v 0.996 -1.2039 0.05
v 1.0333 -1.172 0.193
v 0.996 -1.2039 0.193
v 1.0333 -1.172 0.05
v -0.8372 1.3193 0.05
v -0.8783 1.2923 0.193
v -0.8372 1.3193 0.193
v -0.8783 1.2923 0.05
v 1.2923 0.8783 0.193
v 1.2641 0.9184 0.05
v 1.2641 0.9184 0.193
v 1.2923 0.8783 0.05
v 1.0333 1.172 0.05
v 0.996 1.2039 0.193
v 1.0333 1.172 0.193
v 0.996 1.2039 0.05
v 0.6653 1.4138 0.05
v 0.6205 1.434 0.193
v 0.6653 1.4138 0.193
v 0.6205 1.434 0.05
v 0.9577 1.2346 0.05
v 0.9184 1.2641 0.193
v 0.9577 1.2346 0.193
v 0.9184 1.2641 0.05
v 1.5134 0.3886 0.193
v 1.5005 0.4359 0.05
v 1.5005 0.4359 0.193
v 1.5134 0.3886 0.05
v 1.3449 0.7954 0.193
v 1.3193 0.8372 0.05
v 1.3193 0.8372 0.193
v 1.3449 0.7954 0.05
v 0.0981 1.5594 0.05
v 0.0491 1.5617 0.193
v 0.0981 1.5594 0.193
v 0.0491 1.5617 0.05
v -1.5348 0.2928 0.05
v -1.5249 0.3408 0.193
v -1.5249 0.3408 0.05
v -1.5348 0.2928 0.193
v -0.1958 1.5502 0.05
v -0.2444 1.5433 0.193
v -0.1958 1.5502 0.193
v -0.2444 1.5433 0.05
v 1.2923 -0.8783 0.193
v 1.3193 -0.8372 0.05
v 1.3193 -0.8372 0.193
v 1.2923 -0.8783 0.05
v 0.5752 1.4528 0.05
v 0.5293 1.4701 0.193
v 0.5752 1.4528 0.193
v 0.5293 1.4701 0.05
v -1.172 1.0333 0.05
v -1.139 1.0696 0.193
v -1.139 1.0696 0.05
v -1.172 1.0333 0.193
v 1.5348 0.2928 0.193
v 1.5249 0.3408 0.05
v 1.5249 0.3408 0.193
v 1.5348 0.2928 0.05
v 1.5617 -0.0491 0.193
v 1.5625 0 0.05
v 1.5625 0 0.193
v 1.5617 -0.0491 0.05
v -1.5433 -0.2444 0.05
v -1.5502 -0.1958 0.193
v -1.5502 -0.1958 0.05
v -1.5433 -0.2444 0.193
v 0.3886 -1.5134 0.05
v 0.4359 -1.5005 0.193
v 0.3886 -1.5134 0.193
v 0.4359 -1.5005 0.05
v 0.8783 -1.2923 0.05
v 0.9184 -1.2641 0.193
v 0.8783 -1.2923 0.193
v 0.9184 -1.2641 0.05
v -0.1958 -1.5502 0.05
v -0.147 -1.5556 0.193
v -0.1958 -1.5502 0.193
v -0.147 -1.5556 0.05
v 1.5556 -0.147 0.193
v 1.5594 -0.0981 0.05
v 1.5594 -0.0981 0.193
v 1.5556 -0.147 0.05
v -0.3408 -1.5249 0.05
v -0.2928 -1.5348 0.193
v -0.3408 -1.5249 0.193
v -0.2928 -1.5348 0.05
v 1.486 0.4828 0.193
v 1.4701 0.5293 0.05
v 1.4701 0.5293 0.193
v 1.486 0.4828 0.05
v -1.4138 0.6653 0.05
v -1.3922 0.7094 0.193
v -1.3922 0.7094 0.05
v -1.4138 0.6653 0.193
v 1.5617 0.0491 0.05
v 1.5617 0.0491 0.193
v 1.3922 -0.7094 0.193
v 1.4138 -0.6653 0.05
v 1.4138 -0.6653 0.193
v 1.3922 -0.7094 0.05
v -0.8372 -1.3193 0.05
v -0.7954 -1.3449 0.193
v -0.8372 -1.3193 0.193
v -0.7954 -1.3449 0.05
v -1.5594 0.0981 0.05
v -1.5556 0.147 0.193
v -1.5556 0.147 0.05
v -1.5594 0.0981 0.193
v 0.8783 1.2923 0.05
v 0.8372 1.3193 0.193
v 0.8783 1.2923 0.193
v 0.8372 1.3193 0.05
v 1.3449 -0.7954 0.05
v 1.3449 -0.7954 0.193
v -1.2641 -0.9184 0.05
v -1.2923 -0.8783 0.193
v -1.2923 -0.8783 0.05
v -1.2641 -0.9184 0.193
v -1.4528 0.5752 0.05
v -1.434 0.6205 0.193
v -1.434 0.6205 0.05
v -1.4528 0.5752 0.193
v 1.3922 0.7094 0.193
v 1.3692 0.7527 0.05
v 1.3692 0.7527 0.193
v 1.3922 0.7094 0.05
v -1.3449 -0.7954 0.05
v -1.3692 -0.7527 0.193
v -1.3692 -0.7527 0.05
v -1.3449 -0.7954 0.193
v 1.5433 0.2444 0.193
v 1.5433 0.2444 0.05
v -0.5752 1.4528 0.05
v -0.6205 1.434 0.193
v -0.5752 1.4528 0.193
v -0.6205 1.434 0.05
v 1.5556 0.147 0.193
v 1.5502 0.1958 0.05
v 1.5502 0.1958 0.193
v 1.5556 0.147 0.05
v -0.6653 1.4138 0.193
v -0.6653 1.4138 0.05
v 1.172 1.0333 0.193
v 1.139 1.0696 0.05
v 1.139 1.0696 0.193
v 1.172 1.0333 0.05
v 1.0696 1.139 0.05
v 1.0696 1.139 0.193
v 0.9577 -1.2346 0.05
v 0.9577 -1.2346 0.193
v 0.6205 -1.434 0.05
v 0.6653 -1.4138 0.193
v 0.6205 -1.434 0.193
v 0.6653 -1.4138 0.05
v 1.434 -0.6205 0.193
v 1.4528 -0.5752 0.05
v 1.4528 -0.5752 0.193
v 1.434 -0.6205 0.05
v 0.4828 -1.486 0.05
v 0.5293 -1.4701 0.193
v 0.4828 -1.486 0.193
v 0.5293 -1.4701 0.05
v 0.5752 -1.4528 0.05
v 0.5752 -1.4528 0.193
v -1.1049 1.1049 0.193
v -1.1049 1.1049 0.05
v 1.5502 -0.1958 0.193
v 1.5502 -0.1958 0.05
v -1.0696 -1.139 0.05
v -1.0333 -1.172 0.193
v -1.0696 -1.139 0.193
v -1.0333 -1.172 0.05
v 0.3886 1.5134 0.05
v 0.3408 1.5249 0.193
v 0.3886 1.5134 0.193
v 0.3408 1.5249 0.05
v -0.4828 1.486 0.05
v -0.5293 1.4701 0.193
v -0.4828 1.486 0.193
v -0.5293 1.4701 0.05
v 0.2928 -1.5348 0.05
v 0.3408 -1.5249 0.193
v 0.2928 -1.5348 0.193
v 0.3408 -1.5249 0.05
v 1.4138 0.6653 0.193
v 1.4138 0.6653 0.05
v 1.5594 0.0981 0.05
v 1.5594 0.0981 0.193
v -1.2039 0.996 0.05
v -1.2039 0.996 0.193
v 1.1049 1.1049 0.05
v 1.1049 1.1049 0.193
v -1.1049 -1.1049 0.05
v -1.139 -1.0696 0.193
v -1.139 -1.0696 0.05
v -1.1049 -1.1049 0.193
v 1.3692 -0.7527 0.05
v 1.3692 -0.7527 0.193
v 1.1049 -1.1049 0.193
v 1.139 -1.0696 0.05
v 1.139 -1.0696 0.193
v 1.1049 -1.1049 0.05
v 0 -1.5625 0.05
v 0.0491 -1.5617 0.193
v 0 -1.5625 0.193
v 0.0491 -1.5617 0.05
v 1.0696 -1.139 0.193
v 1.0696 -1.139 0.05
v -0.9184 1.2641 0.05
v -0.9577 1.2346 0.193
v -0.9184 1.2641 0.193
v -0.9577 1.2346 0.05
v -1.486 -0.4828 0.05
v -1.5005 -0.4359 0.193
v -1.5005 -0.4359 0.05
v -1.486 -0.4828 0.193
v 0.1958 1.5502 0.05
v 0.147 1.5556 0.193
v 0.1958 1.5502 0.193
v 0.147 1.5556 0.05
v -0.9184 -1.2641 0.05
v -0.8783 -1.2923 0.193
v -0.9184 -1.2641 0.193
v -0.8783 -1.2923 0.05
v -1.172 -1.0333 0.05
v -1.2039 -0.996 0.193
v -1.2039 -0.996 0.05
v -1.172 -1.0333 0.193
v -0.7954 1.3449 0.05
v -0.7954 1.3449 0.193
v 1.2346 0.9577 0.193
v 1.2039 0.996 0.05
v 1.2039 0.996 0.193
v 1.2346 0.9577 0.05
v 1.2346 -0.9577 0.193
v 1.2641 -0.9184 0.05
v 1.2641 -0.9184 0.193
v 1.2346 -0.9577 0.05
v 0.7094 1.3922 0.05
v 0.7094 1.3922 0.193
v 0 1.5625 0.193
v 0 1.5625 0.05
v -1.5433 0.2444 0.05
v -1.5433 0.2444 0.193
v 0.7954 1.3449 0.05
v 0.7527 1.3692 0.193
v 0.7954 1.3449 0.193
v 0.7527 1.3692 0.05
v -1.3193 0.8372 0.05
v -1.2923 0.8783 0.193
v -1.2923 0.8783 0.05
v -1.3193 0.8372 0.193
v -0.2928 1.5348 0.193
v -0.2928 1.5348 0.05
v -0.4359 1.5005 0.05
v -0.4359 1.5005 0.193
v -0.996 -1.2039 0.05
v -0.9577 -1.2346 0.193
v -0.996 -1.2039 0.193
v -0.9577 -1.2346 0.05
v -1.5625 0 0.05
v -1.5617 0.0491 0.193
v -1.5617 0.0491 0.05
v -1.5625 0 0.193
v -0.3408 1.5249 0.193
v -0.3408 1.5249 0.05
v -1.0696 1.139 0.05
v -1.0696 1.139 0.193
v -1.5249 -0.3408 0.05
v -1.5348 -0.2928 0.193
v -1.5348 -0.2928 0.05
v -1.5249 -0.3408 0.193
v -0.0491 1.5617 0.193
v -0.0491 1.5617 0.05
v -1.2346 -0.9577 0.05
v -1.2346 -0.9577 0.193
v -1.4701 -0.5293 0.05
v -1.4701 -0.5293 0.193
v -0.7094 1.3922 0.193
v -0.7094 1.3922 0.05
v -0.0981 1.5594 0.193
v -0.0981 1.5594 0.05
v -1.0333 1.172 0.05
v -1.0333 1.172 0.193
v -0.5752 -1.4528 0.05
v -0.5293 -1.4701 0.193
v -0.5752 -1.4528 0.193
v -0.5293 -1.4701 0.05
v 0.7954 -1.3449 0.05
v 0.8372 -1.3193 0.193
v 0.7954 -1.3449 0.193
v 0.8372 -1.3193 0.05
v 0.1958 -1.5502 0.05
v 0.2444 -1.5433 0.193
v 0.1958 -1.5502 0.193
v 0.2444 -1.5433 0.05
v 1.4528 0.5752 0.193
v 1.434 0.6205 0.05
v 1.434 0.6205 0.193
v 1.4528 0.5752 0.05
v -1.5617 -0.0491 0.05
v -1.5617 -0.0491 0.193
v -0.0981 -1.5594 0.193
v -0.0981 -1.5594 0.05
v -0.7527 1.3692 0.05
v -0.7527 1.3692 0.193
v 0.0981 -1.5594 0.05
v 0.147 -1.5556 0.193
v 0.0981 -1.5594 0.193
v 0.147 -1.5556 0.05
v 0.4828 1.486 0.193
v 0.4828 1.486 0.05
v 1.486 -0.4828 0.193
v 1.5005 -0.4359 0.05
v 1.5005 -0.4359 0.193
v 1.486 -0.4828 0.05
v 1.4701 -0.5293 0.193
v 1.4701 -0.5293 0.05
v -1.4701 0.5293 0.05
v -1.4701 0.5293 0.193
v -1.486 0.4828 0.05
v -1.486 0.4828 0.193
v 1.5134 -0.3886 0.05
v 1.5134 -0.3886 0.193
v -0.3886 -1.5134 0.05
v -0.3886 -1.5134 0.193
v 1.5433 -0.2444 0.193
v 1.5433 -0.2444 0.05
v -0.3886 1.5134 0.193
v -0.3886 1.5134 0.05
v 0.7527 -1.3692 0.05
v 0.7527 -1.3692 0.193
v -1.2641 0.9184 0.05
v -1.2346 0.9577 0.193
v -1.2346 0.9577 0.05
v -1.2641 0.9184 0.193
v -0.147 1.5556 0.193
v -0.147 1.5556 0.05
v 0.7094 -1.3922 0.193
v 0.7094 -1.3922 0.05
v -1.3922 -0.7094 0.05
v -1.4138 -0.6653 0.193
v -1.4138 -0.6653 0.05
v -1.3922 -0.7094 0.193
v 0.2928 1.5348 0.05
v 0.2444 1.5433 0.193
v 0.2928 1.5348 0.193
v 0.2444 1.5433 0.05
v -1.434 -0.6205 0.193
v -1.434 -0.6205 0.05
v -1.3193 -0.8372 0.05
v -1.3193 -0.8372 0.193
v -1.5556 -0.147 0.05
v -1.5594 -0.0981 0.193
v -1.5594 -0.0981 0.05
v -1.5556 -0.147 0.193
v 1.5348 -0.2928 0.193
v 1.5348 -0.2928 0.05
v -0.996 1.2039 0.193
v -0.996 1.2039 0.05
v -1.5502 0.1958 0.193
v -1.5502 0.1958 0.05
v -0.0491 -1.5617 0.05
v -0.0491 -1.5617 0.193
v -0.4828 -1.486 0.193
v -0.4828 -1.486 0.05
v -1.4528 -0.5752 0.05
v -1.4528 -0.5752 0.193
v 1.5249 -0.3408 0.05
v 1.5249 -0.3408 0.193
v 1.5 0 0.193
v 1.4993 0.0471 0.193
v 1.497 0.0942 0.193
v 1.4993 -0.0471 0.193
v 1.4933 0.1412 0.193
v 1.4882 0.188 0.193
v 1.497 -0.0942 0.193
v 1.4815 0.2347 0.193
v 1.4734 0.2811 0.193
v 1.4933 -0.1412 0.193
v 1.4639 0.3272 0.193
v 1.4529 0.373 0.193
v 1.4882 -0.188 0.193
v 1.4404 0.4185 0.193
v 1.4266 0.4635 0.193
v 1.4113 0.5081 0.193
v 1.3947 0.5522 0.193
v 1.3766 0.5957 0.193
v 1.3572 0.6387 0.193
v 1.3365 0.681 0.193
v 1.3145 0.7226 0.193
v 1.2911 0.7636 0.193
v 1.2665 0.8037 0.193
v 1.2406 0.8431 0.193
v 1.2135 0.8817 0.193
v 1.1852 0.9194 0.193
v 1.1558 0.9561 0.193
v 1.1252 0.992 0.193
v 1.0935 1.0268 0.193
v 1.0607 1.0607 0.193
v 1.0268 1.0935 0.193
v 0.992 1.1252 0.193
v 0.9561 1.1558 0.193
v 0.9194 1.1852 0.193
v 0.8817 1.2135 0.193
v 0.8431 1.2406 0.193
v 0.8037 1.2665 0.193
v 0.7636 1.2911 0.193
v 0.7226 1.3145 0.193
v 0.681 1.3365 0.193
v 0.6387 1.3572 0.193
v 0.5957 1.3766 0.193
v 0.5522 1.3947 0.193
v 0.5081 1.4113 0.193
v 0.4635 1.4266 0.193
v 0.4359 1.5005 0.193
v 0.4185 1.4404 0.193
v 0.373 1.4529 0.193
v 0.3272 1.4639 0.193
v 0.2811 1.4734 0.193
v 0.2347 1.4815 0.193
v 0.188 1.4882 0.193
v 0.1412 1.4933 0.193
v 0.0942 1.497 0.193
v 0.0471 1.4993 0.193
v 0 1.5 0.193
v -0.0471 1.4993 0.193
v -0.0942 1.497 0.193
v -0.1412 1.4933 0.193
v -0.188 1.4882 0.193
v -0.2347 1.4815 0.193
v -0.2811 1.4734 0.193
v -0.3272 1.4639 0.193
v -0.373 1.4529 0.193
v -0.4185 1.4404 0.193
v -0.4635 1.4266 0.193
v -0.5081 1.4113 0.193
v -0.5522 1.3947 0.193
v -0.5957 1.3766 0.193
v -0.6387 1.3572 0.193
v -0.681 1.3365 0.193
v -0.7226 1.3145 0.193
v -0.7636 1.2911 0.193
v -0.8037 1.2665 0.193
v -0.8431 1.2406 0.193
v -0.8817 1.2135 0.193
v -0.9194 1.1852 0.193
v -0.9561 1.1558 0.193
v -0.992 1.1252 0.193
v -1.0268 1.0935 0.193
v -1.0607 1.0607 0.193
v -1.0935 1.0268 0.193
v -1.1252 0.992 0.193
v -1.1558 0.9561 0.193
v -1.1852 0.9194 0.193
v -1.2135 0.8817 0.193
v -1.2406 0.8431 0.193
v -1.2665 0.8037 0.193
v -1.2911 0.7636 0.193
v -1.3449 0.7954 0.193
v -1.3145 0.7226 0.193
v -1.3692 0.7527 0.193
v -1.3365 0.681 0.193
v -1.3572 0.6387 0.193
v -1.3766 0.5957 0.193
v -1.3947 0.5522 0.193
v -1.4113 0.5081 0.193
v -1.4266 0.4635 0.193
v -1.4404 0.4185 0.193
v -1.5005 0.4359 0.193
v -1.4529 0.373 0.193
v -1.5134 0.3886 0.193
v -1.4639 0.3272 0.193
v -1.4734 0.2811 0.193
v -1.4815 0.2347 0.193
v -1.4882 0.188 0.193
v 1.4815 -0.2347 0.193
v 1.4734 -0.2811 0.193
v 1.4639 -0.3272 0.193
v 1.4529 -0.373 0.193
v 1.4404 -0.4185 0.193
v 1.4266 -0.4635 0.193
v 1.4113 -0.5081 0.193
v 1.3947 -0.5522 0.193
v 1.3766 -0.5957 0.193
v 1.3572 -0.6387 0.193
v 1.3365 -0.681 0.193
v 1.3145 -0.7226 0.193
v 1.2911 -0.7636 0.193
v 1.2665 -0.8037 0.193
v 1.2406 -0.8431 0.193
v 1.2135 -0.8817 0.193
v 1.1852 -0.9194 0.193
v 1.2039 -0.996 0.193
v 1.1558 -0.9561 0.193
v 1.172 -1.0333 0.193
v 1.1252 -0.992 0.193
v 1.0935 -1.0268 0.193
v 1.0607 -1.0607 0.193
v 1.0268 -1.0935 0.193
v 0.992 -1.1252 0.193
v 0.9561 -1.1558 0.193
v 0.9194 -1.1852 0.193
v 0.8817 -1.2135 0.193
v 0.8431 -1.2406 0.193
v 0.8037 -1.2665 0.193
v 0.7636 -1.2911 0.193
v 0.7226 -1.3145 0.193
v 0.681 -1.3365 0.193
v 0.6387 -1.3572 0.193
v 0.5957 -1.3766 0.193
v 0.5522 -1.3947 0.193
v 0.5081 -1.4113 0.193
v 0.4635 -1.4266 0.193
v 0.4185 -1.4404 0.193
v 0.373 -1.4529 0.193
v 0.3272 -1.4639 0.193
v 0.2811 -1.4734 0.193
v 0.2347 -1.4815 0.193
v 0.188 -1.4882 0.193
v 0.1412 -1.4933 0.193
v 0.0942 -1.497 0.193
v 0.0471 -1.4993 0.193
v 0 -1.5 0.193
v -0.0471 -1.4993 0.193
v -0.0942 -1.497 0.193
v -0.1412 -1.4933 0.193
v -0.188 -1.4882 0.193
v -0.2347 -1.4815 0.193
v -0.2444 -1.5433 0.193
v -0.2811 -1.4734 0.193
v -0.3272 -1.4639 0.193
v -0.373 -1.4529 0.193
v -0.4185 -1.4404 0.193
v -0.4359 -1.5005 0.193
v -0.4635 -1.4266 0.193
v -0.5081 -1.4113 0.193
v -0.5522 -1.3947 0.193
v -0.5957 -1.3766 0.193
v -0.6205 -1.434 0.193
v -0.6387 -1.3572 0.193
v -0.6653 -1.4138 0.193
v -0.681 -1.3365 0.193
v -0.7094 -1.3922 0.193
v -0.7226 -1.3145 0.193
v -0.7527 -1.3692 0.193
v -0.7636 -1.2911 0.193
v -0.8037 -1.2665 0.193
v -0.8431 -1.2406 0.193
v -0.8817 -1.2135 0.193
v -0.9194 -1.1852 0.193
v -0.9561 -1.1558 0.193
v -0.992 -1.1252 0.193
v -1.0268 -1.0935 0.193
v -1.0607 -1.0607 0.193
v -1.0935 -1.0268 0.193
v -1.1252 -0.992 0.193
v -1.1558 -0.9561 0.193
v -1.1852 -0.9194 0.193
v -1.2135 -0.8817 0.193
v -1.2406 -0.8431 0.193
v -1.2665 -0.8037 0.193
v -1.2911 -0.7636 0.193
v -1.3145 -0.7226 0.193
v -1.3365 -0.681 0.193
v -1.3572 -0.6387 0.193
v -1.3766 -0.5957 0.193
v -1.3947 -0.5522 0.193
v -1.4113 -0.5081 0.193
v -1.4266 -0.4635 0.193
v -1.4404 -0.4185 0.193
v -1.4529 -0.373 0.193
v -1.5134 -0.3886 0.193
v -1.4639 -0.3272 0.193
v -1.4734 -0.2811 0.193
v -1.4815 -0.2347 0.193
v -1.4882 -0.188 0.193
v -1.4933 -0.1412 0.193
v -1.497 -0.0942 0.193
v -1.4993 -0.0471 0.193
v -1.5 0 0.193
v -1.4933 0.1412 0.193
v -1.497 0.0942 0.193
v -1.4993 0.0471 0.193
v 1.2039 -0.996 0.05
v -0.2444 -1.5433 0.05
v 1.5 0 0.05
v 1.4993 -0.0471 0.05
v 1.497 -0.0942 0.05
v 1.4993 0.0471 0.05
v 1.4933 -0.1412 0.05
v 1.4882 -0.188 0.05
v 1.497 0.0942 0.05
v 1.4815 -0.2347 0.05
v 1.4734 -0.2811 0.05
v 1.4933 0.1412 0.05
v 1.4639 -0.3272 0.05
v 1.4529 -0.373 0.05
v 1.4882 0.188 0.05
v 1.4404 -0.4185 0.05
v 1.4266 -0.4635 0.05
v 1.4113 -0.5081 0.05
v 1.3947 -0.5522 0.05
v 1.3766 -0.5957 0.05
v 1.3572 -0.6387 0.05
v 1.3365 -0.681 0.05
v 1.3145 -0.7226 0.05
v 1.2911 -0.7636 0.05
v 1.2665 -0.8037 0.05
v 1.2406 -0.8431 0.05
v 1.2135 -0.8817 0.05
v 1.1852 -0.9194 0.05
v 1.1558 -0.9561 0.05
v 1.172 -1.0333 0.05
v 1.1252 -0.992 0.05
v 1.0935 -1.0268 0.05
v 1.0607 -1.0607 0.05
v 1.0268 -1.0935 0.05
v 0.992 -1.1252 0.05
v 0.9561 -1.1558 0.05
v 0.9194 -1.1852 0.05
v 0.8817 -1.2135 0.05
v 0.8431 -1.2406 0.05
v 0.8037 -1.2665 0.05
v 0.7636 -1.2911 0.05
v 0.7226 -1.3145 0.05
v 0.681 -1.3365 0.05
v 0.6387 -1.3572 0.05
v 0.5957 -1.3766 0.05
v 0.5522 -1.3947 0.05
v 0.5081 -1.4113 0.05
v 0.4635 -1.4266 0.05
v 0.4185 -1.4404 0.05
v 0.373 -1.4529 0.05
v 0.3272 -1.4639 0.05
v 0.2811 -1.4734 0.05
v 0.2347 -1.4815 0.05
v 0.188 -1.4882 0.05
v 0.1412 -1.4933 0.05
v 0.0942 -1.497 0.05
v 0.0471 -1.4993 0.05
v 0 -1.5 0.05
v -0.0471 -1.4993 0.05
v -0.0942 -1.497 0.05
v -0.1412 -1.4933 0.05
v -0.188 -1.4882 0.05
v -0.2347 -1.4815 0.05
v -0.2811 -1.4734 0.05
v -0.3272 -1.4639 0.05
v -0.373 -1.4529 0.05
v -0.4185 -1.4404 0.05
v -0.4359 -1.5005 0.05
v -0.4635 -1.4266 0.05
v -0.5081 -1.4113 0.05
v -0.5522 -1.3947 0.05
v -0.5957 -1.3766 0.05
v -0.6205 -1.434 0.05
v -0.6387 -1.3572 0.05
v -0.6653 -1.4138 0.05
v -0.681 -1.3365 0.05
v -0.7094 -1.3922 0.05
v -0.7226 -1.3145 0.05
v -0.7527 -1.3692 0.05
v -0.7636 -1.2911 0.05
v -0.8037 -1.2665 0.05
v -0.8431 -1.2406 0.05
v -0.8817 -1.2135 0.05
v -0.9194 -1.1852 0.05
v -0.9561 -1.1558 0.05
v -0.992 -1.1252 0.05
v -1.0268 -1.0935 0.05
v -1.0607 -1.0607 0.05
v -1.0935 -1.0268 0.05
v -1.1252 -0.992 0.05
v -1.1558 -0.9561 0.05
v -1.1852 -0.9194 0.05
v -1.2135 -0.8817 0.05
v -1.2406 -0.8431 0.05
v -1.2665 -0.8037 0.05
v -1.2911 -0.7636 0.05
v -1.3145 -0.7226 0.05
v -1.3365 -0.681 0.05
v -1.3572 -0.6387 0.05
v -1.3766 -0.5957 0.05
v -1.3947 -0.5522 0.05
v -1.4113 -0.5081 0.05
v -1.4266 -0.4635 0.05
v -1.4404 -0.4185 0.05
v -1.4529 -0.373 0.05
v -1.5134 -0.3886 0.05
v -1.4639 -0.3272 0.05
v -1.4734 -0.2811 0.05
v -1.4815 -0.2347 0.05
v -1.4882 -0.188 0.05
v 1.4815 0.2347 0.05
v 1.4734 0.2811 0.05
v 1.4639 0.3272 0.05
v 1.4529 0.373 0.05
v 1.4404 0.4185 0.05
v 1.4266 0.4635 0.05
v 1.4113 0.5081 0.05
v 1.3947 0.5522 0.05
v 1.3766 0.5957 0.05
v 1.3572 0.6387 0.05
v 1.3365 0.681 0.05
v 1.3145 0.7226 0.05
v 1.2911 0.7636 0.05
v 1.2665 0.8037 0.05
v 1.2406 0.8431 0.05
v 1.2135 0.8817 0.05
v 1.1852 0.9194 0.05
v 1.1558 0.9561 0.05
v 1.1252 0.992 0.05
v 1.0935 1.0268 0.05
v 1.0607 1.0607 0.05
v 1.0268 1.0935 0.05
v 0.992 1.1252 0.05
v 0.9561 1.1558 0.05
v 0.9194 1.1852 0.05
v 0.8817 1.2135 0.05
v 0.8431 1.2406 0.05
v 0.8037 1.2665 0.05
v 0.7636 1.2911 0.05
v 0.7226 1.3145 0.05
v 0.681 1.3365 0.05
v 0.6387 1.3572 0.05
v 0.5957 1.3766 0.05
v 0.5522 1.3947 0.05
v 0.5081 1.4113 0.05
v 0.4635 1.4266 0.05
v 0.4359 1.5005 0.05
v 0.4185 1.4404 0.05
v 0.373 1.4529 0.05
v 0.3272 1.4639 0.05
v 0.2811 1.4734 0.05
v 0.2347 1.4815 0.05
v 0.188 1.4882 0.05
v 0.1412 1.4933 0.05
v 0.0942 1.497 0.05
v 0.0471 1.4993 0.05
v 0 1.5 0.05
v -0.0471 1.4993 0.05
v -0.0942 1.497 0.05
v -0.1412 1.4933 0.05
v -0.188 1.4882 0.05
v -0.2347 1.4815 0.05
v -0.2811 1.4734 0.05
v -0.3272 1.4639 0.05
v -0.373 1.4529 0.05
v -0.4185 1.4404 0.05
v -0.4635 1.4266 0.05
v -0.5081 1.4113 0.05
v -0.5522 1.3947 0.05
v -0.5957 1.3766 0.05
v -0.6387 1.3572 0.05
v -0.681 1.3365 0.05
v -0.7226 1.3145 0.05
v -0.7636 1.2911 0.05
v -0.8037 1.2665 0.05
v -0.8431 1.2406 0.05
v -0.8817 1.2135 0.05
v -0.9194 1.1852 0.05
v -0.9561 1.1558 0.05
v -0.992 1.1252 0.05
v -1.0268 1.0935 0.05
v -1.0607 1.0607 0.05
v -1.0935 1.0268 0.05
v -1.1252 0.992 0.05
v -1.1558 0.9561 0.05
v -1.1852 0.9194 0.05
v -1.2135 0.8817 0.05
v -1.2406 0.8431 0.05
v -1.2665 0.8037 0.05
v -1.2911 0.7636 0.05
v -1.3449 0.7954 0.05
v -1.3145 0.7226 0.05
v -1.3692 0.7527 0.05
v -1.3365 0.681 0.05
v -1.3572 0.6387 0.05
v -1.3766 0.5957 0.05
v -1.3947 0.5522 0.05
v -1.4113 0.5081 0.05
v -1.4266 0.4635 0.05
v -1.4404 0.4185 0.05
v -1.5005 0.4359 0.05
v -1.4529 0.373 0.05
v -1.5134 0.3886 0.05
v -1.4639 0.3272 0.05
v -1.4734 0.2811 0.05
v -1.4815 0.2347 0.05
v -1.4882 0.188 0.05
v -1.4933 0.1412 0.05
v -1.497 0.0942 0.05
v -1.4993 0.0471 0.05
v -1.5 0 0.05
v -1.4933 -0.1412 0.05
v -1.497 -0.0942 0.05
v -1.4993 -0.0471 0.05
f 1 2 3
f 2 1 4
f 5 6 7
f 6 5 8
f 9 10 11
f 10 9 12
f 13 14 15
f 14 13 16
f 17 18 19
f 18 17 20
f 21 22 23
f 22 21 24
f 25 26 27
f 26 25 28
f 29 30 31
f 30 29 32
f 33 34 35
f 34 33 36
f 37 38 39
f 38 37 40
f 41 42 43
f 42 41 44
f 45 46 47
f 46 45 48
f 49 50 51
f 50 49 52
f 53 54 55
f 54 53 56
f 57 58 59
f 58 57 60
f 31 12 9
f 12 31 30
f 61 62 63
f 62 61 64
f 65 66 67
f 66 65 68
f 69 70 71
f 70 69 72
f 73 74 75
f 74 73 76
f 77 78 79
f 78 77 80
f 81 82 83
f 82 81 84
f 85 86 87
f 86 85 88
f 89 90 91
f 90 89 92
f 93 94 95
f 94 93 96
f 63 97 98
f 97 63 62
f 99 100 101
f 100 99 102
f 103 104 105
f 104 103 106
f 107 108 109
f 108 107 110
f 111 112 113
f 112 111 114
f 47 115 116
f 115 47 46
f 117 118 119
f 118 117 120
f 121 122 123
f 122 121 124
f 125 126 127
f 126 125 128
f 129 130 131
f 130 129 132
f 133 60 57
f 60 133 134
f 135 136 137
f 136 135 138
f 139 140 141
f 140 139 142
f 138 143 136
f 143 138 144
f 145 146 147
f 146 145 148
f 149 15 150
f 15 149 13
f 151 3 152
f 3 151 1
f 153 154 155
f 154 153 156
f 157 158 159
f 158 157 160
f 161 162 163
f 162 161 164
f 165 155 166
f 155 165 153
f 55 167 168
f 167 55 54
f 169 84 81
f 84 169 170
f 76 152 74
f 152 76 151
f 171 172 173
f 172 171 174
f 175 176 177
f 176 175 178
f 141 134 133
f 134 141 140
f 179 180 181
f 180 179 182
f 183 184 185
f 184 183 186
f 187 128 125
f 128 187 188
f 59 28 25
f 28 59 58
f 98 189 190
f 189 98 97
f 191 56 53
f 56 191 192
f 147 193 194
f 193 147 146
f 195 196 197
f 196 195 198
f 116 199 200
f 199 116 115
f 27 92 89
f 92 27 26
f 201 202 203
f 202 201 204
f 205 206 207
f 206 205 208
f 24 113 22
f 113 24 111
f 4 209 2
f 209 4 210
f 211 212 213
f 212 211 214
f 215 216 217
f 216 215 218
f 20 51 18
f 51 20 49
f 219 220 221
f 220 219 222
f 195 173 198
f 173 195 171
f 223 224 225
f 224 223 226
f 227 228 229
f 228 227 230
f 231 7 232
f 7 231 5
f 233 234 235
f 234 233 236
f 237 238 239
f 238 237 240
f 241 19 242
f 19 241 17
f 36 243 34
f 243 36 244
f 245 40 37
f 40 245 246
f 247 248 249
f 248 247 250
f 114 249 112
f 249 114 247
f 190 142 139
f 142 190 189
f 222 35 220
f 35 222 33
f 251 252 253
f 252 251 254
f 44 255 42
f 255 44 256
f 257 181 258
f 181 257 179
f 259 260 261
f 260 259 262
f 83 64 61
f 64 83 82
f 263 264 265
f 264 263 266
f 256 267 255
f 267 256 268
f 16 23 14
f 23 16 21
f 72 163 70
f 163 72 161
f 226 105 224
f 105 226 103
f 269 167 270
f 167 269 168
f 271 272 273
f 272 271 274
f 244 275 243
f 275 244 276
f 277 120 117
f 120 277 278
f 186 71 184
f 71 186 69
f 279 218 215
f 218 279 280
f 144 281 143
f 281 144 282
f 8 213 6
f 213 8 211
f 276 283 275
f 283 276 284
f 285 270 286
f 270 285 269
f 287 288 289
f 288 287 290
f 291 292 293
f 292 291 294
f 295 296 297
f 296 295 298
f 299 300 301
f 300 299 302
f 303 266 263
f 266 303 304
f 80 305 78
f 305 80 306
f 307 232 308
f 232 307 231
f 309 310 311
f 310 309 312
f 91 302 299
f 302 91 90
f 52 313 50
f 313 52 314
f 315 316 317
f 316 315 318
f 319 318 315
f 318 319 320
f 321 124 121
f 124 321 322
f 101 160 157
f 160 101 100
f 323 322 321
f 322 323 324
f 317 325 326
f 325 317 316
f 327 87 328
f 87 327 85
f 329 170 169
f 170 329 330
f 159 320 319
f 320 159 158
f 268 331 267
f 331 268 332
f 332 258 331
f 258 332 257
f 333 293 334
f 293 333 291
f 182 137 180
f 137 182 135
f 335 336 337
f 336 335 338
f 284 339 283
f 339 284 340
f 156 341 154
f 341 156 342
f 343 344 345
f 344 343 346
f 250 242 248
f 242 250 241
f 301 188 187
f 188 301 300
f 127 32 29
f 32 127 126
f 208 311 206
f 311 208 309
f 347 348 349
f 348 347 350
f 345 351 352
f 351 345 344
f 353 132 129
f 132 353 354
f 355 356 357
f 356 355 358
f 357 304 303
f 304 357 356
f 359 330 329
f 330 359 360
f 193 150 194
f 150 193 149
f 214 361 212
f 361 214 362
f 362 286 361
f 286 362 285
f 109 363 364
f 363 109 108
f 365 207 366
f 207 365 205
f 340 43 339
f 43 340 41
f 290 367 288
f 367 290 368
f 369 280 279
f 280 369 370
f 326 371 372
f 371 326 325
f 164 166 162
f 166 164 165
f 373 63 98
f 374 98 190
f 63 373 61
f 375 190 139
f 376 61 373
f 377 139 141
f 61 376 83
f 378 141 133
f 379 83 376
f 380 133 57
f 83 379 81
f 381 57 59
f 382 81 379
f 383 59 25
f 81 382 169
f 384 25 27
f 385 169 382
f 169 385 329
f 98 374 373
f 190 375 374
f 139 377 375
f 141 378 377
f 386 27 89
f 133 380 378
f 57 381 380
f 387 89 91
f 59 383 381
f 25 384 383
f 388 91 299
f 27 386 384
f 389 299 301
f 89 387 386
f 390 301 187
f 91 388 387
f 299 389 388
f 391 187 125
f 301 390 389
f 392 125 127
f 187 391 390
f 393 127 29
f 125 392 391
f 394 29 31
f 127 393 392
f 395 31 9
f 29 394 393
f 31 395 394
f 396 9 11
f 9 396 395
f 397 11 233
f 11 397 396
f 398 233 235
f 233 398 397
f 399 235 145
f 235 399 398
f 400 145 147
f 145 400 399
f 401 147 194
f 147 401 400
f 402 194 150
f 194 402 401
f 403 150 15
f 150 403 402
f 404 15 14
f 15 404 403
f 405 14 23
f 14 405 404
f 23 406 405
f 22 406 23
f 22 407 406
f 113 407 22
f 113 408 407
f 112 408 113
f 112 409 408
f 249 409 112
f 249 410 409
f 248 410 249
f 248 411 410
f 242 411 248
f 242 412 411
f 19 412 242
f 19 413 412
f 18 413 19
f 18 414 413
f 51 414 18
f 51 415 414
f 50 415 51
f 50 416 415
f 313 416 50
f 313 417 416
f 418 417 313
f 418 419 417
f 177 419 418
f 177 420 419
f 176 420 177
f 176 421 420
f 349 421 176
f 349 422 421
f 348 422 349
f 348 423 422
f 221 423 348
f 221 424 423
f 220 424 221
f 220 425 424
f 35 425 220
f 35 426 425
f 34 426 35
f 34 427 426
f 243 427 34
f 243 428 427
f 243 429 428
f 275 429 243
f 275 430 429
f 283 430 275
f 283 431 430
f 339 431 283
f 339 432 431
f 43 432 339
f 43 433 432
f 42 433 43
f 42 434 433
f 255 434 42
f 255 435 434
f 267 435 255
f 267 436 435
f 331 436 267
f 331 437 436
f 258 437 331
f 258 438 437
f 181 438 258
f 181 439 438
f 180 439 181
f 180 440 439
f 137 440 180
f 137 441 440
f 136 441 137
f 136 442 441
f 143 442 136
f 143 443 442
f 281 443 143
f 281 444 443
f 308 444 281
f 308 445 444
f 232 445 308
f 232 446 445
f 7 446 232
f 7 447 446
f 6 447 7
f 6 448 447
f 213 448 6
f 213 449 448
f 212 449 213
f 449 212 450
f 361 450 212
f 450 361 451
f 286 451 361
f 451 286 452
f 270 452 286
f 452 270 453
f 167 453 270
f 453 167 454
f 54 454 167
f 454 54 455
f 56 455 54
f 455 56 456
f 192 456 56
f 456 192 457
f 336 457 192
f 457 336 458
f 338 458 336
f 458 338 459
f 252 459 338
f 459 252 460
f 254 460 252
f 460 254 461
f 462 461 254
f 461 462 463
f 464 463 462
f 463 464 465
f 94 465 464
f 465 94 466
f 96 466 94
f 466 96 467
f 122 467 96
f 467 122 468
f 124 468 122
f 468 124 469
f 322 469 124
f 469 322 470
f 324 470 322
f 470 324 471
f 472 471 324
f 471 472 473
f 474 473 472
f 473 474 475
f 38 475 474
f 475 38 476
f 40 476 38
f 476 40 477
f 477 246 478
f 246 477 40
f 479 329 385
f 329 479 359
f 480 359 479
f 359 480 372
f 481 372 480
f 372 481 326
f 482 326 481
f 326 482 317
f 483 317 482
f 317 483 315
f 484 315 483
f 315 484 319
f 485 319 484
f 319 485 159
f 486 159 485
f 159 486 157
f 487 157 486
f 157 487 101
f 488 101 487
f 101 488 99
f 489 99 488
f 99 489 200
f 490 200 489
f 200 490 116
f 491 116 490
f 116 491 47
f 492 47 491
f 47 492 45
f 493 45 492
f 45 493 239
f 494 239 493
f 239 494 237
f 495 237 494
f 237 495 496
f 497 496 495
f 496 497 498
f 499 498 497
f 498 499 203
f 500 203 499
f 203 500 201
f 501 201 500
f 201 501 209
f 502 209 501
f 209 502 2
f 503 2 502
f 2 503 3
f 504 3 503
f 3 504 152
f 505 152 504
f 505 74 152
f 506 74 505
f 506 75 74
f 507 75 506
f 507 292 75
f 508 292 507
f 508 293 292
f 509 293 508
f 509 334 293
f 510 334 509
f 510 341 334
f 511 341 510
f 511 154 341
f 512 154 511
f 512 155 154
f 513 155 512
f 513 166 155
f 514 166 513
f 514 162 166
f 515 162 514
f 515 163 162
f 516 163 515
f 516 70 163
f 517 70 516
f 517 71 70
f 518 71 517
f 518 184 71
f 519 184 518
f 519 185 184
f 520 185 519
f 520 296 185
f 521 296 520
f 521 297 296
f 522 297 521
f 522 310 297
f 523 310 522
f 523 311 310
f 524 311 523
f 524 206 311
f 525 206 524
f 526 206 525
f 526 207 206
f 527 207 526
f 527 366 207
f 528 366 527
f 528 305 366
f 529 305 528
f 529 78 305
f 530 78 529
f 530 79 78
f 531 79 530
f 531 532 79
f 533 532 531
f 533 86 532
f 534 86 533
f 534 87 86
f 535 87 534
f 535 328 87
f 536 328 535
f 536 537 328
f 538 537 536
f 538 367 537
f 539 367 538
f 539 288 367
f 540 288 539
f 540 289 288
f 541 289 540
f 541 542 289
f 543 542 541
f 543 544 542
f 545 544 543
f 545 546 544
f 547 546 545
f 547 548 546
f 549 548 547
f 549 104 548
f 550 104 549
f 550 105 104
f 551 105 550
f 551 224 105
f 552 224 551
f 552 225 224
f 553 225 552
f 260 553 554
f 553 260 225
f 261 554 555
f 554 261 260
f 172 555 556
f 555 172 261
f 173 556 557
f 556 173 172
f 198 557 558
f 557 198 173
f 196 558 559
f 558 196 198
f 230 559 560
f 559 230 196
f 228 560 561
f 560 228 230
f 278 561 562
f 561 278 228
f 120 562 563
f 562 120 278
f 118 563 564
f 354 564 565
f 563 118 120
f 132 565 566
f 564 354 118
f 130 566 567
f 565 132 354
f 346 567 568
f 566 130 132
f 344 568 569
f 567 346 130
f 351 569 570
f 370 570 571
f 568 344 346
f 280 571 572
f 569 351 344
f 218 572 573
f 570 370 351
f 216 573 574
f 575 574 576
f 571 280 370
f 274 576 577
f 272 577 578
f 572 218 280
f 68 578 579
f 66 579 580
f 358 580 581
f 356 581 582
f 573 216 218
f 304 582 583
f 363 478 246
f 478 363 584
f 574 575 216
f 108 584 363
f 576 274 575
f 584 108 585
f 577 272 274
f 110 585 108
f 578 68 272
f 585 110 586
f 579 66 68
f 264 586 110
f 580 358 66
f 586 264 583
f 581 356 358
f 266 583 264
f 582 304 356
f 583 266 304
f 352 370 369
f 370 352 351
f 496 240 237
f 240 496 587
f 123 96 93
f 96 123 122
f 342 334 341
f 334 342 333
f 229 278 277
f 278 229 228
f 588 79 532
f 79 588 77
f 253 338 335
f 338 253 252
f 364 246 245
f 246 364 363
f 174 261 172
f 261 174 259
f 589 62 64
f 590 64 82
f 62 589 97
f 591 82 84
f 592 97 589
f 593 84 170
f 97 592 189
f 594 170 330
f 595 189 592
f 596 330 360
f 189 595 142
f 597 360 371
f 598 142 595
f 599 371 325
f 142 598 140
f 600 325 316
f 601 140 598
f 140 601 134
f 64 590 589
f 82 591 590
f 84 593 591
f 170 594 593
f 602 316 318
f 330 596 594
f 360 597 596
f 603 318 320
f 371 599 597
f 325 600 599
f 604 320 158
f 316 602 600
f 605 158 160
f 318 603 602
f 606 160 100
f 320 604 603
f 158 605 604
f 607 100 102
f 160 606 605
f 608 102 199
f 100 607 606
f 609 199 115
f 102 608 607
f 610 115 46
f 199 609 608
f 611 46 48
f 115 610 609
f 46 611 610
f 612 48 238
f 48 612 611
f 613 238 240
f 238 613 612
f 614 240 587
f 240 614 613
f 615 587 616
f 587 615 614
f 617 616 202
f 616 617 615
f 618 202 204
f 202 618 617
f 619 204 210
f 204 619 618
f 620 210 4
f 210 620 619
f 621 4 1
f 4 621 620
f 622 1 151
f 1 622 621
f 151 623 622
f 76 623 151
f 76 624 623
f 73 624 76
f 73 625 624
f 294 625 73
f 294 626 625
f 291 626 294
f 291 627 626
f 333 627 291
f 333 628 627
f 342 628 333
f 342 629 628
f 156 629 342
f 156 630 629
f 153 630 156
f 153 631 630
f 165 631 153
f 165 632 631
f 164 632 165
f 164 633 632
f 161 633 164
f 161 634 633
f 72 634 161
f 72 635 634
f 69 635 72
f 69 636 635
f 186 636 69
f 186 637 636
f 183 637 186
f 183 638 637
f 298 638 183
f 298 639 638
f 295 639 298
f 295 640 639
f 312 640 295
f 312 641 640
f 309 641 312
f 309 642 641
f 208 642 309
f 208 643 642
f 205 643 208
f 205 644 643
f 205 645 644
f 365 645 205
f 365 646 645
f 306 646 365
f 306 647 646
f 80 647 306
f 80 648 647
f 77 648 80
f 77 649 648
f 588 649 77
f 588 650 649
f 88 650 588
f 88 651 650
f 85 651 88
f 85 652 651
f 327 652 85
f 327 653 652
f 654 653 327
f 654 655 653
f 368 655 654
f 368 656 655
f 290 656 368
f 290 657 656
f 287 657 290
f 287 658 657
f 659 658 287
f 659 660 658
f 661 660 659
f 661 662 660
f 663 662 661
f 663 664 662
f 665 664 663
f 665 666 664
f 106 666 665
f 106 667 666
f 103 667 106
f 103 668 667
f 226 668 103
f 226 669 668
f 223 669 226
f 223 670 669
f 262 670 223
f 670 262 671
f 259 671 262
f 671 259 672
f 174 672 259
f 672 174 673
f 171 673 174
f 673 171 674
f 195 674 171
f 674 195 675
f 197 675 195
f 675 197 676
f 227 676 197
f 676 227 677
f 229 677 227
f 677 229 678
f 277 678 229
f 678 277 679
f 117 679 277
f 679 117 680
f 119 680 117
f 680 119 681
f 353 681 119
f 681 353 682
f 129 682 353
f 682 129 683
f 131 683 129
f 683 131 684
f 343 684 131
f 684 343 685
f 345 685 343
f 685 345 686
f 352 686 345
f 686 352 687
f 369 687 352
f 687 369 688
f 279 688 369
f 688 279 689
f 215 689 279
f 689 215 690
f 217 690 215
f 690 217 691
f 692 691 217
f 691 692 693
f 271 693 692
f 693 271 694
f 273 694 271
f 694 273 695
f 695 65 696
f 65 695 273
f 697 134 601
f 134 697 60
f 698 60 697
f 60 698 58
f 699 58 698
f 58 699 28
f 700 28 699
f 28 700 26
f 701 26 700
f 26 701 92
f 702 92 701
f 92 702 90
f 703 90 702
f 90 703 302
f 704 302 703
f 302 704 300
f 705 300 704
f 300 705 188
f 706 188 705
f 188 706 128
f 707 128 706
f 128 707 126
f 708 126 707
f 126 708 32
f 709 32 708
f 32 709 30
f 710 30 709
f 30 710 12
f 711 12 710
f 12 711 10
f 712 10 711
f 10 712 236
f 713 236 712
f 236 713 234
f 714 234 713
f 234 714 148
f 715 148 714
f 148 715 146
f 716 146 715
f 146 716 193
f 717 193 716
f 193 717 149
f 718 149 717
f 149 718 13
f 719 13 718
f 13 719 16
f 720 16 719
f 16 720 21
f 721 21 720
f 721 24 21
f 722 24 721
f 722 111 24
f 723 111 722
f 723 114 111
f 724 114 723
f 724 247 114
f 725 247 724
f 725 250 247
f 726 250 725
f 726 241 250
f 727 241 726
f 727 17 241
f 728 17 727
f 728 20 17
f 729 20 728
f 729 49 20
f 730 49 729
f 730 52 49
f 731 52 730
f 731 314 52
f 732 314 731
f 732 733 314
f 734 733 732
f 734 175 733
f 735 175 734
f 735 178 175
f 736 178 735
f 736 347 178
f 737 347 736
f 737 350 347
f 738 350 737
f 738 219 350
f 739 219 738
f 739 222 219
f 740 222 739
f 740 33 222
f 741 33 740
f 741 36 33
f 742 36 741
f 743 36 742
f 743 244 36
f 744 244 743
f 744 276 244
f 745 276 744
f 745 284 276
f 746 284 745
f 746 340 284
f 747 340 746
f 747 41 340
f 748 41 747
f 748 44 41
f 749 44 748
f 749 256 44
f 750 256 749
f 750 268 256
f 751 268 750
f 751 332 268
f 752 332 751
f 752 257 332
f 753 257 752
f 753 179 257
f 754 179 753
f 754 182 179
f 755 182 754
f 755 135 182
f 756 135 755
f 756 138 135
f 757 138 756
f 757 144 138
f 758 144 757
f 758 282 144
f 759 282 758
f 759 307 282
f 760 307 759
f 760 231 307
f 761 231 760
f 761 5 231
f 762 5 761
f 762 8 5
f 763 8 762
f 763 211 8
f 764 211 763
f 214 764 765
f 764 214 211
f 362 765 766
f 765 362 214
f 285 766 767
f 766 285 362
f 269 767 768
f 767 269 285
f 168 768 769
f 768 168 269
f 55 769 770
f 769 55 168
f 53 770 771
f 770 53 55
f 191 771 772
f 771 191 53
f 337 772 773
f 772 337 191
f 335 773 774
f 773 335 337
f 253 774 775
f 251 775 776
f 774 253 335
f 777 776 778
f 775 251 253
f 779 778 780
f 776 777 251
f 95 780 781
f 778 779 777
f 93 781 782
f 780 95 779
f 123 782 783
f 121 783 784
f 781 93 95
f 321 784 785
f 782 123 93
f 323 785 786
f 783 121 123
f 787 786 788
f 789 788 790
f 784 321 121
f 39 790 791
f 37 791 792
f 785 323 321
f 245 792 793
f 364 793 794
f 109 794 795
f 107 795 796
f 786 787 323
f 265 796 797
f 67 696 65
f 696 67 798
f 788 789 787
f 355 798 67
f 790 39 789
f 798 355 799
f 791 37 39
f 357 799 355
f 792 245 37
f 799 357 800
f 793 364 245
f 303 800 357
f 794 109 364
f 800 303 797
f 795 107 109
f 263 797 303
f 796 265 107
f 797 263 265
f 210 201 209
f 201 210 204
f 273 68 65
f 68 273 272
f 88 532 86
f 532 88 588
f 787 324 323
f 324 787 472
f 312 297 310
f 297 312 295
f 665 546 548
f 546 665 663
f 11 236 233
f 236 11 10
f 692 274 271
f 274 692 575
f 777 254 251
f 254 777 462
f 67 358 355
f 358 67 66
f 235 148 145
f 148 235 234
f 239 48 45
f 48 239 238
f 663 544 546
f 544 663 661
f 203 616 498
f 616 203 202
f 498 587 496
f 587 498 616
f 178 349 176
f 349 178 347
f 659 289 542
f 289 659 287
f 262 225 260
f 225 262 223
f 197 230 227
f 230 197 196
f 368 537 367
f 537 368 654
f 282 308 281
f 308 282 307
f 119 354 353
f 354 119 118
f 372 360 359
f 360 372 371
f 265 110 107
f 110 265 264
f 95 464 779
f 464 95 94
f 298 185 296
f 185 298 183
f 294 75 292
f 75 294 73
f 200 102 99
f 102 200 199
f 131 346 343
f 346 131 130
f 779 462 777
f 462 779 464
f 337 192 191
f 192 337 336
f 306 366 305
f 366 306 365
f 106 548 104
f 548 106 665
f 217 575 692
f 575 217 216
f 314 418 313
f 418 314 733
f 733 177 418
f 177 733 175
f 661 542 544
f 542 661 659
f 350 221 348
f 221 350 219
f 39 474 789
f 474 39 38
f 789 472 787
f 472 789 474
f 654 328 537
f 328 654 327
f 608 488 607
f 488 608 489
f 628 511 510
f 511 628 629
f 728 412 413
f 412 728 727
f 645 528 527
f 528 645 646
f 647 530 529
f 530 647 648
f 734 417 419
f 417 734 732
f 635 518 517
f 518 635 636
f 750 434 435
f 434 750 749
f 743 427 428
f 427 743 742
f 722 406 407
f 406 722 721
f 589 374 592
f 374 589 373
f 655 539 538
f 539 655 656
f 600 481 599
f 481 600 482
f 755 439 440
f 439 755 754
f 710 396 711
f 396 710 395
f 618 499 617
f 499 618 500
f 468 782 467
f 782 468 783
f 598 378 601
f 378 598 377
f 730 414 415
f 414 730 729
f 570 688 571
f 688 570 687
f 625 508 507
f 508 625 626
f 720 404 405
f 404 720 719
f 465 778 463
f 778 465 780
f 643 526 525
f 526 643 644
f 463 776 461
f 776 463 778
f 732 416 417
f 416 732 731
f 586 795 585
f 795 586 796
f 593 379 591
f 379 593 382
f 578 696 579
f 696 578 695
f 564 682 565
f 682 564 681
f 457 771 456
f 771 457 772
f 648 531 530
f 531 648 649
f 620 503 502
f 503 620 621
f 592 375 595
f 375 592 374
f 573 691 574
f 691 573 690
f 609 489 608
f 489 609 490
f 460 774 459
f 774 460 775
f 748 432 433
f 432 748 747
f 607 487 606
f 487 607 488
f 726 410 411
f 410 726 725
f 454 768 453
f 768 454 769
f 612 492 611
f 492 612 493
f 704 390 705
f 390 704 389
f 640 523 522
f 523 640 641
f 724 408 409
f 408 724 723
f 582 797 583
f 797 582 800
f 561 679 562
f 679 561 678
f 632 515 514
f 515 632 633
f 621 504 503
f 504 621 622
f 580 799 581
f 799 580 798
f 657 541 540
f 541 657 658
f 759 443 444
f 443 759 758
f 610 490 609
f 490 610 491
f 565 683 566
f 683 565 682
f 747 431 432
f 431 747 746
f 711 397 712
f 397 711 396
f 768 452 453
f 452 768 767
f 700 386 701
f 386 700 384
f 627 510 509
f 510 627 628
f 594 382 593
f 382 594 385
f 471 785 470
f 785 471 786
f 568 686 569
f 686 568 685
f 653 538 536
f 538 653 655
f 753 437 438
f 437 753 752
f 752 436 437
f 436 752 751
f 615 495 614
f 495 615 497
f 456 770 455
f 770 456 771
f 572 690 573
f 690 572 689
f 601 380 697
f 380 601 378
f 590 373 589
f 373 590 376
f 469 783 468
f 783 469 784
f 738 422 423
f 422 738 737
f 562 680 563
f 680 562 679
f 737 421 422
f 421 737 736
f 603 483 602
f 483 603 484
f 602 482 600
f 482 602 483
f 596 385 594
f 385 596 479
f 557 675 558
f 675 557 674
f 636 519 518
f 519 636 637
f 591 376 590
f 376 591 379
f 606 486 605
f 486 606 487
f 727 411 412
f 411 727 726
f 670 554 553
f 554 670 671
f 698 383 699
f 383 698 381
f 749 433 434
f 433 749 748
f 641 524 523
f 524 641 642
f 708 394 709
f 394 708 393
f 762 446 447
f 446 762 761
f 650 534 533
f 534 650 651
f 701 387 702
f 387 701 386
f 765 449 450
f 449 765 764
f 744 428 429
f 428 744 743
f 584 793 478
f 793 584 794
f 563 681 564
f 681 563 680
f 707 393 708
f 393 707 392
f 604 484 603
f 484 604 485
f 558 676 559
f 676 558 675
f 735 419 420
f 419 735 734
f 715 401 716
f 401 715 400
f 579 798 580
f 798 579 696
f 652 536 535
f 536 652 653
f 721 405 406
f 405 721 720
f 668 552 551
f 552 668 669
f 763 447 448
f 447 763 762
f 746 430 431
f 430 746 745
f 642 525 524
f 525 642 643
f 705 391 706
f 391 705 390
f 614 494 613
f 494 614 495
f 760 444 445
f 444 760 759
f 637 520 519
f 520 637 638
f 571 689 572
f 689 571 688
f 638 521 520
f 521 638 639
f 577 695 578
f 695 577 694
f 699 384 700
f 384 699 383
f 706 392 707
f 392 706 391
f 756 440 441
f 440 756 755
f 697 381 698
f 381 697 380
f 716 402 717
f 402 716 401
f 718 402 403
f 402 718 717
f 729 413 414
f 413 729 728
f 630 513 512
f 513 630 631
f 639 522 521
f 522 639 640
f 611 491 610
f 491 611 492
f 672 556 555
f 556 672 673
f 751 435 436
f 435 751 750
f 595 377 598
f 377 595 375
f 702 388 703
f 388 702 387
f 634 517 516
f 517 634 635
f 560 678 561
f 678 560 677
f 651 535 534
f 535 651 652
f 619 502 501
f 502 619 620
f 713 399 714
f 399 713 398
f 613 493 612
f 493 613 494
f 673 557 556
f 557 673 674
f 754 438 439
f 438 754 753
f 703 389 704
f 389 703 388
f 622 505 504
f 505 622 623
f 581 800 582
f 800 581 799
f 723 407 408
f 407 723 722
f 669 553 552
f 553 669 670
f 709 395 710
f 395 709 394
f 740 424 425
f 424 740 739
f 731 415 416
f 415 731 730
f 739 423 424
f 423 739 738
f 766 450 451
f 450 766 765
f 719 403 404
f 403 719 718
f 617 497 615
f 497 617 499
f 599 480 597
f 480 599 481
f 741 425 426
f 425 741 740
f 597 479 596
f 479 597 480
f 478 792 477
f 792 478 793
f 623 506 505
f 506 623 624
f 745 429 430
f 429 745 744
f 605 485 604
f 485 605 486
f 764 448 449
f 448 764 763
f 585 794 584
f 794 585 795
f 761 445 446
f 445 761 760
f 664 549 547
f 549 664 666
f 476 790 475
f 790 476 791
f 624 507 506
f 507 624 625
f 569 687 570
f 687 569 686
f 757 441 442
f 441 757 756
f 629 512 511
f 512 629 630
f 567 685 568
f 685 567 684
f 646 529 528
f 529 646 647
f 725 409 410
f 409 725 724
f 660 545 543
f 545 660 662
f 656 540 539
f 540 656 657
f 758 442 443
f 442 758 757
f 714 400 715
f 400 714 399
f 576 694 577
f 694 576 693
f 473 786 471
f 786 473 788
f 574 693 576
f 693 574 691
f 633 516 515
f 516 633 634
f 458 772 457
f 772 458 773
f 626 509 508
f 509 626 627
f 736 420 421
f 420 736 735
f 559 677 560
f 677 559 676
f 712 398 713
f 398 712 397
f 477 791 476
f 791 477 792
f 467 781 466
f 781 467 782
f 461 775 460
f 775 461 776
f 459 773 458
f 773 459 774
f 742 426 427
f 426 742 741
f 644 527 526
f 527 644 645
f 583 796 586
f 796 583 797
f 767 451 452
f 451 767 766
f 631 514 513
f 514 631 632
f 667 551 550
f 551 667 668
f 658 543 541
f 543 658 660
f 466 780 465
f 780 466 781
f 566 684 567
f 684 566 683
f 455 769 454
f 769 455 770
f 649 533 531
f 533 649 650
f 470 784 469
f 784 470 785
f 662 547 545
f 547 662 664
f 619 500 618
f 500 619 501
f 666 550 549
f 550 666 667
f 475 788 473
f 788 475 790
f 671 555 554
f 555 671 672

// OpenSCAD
module FlatHead(x, y, z)
{
  translate([x,y,z-0.075])
    union() {
      translate([0, 0, 0.085])
        cylinder(h = 0.200, d = 0.225, center = false, $fn = 100);
      cylinder(h = 0.085, d1 = 0.125, d2 = 0.225, center = false, $fn = 100);
      translate([0, 0, -0.200])
        cylinder(h = 0.300, d = 0.125, center = false, $fn = 100);
  }
}

module HexNut440(x, y, rot)
{
  rotate(a = rot, v = [0, 0, 1])
    translate([x,y,0 - 0.010])
      union() {
        rotate([0, 0, 30])
          cylinder(h = 0.075 + 0.010, d = 0.200, center = false, $fn = 6);
        cylinder(h = 0.500, d = 0.125, center = true, $fn = 100);
      }
}



union() {
  difference() {
    linear_extrude(height = 0.1, center = false, convexity = 10, slices = 10)
       import(file = "FlangeAOutline.dxf");

    /* cut center hole */
    cylinder (h = 0.5, d=2.35, center=true, $fn = 250);

    /* cut mounting holes */
    translate([1.25, 1.25, 0])
       cylinder(h = 0.5, d = 0.188, center = true, $fn = 40);
    translate([-1.25, 1.25, 0])
       cylinder(h = 0.5, d = 0.188, center = true, $fn = 40);
    translate([1.25, -1.25, 0])
       cylinder(h = 0.5, d = 0.188, center = true, $fn = 40);
    translate([-1.25, -1.25, 0])
       cylinder(h = 0.5, d = 0.188, center = true, $fn = 40);

    /* access for assembly screws */
    FlatHead(1, 2.75/2, 0.100);
    FlatHead(-1, 2.75/2, 0.100);
    FlatHead(1, -2.75/2, 0.100);
    FlatHead(-1, -2.75/2, 0.100);
    FlatHead(2.75/2, 1, 0.100);
    FlatHead(-2.75/2, 1, 0.100);
    FlatHead(2.75/2, -1, 0.100);
    FlatHead(-2.75/2, -1, 0.100);

    /* Front gear deck mounting holes and nuts */
    HexNut440(2.627 / 2, 0, 0);
    HexNut440(2.627 / 2, 0, 45);
    HexNut440(2.627 / 2, 0, 90);
    HexNut440(2.627 / 2, 0, 135);
    HexNut440(2.627 / 2, 0, 180);
    HexNut440(2.627 / 2, 0, 225);
    HexNut440(2.627 / 2, 0, 270);
    HexNut440(2.627 / 2, 0, 315);

  }

  /* rim for front gear deck */
  translate([0, 0, 0.05])
    difference() {
      cylinder (h = 0.193 - 0.05, d=3.125, center = false, $fn = 200);
      cylinder (h = 0.5, d=3.000, center = true, $fn = 200);
  }

}
